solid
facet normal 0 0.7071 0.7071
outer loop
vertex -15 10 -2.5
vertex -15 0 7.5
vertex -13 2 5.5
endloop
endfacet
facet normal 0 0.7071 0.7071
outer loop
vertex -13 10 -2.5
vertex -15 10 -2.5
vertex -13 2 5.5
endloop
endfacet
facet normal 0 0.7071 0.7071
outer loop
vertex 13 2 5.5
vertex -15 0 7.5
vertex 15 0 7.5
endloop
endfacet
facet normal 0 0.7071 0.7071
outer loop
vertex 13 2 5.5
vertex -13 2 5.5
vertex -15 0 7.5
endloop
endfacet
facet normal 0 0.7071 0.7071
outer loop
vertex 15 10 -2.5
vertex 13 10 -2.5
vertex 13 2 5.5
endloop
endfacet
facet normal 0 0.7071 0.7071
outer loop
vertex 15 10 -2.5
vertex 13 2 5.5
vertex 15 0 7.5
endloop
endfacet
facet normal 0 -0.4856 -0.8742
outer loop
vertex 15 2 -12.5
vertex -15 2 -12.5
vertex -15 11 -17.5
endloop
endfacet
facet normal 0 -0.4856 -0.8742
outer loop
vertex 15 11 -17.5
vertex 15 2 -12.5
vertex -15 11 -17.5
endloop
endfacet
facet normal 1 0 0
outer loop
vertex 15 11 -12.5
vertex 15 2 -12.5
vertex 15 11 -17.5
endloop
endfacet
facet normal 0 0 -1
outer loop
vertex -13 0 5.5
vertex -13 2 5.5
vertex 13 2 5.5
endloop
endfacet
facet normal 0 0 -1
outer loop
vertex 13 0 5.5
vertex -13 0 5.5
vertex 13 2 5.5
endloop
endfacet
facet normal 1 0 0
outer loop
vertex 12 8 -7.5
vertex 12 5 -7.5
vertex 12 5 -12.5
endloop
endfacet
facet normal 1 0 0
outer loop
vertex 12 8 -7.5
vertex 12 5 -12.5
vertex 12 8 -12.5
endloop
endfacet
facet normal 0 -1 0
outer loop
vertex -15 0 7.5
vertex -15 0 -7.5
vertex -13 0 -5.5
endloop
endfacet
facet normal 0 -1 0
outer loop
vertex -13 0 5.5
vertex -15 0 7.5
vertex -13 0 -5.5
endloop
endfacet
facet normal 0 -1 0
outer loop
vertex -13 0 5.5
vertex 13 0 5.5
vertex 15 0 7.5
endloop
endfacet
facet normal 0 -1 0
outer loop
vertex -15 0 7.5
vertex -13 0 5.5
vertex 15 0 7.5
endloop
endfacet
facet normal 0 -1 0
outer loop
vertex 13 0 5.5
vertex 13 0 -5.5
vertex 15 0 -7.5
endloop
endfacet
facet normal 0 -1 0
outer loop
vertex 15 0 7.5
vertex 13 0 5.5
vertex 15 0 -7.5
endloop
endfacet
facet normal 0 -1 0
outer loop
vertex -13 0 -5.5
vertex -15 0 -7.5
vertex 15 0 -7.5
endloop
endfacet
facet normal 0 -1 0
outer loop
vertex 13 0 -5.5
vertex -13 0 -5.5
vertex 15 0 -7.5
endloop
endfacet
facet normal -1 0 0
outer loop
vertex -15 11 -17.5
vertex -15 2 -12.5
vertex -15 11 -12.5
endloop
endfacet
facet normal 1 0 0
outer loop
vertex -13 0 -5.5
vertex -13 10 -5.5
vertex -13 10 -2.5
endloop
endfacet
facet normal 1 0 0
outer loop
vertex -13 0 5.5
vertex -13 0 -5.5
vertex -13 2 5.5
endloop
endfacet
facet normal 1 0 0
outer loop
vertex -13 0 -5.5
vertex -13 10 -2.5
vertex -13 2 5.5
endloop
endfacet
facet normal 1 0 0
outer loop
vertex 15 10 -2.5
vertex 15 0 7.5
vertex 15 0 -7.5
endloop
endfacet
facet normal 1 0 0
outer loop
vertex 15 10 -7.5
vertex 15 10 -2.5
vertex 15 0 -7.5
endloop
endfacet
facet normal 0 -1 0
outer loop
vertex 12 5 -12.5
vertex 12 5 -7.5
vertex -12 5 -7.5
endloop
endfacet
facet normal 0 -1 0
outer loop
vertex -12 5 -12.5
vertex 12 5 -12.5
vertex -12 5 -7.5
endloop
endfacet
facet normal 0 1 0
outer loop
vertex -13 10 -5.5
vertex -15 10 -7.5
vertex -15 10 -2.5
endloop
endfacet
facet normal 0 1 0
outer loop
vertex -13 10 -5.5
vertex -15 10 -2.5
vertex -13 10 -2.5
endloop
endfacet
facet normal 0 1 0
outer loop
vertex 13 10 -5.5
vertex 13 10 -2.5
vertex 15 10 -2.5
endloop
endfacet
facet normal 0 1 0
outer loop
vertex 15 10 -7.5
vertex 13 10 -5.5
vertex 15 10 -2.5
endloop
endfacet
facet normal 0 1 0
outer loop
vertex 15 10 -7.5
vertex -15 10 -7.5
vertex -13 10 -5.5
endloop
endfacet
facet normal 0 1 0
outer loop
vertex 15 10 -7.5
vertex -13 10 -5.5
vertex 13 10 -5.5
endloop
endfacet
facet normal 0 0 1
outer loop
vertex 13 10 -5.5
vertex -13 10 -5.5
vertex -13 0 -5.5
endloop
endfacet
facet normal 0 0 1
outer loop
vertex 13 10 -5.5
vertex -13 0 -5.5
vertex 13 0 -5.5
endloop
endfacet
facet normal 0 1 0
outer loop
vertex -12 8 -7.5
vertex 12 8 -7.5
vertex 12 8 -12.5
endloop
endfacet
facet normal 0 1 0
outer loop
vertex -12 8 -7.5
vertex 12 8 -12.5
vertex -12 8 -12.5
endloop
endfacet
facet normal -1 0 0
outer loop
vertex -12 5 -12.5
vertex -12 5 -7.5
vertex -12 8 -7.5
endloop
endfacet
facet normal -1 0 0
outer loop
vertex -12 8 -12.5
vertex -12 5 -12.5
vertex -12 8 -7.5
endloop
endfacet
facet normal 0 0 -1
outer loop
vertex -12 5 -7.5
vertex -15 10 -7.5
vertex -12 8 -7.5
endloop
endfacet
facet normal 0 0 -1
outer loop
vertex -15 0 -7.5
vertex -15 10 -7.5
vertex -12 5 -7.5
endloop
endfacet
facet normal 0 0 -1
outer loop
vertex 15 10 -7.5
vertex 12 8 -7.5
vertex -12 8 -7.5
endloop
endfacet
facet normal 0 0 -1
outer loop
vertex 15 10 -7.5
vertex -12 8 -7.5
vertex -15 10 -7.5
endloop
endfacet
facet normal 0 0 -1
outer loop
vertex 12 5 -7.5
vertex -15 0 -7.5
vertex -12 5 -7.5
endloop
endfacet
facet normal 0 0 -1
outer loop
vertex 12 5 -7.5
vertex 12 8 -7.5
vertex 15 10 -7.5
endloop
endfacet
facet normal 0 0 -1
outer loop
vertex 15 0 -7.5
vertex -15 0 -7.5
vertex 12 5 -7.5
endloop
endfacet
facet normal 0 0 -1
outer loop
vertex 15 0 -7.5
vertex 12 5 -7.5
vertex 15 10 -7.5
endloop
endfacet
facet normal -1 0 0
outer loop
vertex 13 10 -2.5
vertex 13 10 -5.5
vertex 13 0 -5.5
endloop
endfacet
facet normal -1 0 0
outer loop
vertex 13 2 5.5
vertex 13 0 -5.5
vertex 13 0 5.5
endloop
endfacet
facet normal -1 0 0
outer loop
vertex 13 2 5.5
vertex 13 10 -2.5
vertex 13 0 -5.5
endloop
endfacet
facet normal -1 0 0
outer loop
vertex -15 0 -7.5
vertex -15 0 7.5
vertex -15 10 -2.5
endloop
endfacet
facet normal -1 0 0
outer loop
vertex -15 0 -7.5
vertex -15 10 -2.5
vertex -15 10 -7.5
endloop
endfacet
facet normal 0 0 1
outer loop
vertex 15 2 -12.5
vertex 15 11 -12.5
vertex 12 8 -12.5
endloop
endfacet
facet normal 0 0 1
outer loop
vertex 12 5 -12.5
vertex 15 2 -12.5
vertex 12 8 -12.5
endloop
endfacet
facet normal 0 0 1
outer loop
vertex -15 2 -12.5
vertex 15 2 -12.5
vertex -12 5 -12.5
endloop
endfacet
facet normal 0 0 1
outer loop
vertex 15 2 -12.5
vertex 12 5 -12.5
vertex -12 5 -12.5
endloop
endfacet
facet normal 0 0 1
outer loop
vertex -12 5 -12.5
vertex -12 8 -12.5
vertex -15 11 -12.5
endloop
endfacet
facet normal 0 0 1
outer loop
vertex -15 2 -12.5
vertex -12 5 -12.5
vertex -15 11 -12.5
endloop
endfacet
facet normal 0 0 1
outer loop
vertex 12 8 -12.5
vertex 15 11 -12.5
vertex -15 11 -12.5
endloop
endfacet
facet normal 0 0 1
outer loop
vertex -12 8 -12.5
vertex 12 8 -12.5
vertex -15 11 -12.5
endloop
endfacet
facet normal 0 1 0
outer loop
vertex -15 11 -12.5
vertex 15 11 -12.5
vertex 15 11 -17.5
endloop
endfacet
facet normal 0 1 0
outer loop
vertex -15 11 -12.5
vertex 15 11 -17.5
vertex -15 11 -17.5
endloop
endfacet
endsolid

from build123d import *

# Parameters (mm, degrees)
SKETCH12_W               = 30
SKETCH12_H               = 15
BOSS_EXTRUDE4_DEPTH      = 10
CHAMFER1_SIZE            = 10
SKETCH14_W               = 24
SKETCH14_H               = 3
BOSS_EXTRUDE5_DEPTH      = 5
SKETCH15_W               = 30
SKETCH15_H               = 9
BOSS_EXTRUDE6_DEPTH      = 5
CUT_EXTRUDE10_DEPTH      = 37.431442464
CUT_EXTRUDE10_DEPTH_BACK = 37.431442464
CUT_EXTRUDE11_DEPTH      = 26.539185578
CUT_EXTRUDE11_DEPTH_BACK = 26.539185578
SKETCH18_W               = 26
SKETCH18_H               = 11


with BuildPart() as part:
    # Sketch12 → Boss-Extrude4 (new body)
    with BuildSketch(Plane(origin=(0, 0, 0), x_dir=(1, 0, 0), z_dir=(0, 1, 0))):
        Rectangle(SKETCH12_W, SKETCH12_H)
    extrude(amount=BOSS_EXTRUDE4_DEPTH)

    # Chamfer1
    chamfer1_edges = [part.edges().sort_by_distance(p)[0] for p in [
        (0, 10, 7.5),
    ]]
    chamfer(chamfer1_edges, length=CHAMFER1_SIZE - 0.0001)  # a hair under: the kernel refuses the full size

    # Sketch14 → Boss-Extrude5 (add)
    with BuildSketch(Plane(origin=(0, 0, -7.5), x_dir=(-1, 0, 0), z_dir=(0, 0, -1))):
        with Locations((0, 6.5)):
            Rectangle(SKETCH14_W, SKETCH14_H)
    extrude(amount=BOSS_EXTRUDE5_DEPTH)

    # Sketch15 → Boss-Extrude6 (add)
    with BuildSketch(Plane(origin=(0, 0, -12.5), x_dir=(-1, 0, 0), z_dir=(0, 0, -1))):
        with Locations((0, 6.5)):
            Rectangle(SKETCH15_W, SKETCH15_H)
    extrude(amount=BOSS_EXTRUDE6_DEPTH)

    # Sketch17 → Cut-Extrude10 (cut, two sides: drawn at the far end of the back side and taken through both)
    with BuildSketch(Plane.ZY.offset(15).offset(-CUT_EXTRUDE10_DEPTH_BACK)):
        Polygon((-12.5, 2), (-17.5, 11), (-17.5, 2), align=None)
    extrude(amount=CUT_EXTRUDE10_DEPTH + CUT_EXTRUDE10_DEPTH_BACK, mode=Mode.SUBTRACT)

    # Sketch18 → Cut-Extrude11 (cut, two sides: drawn at the far end of the back side and taken through both)
    with BuildSketch(Plane.XZ.offset(-CUT_EXTRUDE11_DEPTH_BACK)):
        Rectangle(SKETCH18_W, SKETCH18_H)
    extrude(amount=CUT_EXTRUDE11_DEPTH + CUT_EXTRUDE11_DEPTH_BACK, mode=Mode.SUBTRACT)


solid = part.part
